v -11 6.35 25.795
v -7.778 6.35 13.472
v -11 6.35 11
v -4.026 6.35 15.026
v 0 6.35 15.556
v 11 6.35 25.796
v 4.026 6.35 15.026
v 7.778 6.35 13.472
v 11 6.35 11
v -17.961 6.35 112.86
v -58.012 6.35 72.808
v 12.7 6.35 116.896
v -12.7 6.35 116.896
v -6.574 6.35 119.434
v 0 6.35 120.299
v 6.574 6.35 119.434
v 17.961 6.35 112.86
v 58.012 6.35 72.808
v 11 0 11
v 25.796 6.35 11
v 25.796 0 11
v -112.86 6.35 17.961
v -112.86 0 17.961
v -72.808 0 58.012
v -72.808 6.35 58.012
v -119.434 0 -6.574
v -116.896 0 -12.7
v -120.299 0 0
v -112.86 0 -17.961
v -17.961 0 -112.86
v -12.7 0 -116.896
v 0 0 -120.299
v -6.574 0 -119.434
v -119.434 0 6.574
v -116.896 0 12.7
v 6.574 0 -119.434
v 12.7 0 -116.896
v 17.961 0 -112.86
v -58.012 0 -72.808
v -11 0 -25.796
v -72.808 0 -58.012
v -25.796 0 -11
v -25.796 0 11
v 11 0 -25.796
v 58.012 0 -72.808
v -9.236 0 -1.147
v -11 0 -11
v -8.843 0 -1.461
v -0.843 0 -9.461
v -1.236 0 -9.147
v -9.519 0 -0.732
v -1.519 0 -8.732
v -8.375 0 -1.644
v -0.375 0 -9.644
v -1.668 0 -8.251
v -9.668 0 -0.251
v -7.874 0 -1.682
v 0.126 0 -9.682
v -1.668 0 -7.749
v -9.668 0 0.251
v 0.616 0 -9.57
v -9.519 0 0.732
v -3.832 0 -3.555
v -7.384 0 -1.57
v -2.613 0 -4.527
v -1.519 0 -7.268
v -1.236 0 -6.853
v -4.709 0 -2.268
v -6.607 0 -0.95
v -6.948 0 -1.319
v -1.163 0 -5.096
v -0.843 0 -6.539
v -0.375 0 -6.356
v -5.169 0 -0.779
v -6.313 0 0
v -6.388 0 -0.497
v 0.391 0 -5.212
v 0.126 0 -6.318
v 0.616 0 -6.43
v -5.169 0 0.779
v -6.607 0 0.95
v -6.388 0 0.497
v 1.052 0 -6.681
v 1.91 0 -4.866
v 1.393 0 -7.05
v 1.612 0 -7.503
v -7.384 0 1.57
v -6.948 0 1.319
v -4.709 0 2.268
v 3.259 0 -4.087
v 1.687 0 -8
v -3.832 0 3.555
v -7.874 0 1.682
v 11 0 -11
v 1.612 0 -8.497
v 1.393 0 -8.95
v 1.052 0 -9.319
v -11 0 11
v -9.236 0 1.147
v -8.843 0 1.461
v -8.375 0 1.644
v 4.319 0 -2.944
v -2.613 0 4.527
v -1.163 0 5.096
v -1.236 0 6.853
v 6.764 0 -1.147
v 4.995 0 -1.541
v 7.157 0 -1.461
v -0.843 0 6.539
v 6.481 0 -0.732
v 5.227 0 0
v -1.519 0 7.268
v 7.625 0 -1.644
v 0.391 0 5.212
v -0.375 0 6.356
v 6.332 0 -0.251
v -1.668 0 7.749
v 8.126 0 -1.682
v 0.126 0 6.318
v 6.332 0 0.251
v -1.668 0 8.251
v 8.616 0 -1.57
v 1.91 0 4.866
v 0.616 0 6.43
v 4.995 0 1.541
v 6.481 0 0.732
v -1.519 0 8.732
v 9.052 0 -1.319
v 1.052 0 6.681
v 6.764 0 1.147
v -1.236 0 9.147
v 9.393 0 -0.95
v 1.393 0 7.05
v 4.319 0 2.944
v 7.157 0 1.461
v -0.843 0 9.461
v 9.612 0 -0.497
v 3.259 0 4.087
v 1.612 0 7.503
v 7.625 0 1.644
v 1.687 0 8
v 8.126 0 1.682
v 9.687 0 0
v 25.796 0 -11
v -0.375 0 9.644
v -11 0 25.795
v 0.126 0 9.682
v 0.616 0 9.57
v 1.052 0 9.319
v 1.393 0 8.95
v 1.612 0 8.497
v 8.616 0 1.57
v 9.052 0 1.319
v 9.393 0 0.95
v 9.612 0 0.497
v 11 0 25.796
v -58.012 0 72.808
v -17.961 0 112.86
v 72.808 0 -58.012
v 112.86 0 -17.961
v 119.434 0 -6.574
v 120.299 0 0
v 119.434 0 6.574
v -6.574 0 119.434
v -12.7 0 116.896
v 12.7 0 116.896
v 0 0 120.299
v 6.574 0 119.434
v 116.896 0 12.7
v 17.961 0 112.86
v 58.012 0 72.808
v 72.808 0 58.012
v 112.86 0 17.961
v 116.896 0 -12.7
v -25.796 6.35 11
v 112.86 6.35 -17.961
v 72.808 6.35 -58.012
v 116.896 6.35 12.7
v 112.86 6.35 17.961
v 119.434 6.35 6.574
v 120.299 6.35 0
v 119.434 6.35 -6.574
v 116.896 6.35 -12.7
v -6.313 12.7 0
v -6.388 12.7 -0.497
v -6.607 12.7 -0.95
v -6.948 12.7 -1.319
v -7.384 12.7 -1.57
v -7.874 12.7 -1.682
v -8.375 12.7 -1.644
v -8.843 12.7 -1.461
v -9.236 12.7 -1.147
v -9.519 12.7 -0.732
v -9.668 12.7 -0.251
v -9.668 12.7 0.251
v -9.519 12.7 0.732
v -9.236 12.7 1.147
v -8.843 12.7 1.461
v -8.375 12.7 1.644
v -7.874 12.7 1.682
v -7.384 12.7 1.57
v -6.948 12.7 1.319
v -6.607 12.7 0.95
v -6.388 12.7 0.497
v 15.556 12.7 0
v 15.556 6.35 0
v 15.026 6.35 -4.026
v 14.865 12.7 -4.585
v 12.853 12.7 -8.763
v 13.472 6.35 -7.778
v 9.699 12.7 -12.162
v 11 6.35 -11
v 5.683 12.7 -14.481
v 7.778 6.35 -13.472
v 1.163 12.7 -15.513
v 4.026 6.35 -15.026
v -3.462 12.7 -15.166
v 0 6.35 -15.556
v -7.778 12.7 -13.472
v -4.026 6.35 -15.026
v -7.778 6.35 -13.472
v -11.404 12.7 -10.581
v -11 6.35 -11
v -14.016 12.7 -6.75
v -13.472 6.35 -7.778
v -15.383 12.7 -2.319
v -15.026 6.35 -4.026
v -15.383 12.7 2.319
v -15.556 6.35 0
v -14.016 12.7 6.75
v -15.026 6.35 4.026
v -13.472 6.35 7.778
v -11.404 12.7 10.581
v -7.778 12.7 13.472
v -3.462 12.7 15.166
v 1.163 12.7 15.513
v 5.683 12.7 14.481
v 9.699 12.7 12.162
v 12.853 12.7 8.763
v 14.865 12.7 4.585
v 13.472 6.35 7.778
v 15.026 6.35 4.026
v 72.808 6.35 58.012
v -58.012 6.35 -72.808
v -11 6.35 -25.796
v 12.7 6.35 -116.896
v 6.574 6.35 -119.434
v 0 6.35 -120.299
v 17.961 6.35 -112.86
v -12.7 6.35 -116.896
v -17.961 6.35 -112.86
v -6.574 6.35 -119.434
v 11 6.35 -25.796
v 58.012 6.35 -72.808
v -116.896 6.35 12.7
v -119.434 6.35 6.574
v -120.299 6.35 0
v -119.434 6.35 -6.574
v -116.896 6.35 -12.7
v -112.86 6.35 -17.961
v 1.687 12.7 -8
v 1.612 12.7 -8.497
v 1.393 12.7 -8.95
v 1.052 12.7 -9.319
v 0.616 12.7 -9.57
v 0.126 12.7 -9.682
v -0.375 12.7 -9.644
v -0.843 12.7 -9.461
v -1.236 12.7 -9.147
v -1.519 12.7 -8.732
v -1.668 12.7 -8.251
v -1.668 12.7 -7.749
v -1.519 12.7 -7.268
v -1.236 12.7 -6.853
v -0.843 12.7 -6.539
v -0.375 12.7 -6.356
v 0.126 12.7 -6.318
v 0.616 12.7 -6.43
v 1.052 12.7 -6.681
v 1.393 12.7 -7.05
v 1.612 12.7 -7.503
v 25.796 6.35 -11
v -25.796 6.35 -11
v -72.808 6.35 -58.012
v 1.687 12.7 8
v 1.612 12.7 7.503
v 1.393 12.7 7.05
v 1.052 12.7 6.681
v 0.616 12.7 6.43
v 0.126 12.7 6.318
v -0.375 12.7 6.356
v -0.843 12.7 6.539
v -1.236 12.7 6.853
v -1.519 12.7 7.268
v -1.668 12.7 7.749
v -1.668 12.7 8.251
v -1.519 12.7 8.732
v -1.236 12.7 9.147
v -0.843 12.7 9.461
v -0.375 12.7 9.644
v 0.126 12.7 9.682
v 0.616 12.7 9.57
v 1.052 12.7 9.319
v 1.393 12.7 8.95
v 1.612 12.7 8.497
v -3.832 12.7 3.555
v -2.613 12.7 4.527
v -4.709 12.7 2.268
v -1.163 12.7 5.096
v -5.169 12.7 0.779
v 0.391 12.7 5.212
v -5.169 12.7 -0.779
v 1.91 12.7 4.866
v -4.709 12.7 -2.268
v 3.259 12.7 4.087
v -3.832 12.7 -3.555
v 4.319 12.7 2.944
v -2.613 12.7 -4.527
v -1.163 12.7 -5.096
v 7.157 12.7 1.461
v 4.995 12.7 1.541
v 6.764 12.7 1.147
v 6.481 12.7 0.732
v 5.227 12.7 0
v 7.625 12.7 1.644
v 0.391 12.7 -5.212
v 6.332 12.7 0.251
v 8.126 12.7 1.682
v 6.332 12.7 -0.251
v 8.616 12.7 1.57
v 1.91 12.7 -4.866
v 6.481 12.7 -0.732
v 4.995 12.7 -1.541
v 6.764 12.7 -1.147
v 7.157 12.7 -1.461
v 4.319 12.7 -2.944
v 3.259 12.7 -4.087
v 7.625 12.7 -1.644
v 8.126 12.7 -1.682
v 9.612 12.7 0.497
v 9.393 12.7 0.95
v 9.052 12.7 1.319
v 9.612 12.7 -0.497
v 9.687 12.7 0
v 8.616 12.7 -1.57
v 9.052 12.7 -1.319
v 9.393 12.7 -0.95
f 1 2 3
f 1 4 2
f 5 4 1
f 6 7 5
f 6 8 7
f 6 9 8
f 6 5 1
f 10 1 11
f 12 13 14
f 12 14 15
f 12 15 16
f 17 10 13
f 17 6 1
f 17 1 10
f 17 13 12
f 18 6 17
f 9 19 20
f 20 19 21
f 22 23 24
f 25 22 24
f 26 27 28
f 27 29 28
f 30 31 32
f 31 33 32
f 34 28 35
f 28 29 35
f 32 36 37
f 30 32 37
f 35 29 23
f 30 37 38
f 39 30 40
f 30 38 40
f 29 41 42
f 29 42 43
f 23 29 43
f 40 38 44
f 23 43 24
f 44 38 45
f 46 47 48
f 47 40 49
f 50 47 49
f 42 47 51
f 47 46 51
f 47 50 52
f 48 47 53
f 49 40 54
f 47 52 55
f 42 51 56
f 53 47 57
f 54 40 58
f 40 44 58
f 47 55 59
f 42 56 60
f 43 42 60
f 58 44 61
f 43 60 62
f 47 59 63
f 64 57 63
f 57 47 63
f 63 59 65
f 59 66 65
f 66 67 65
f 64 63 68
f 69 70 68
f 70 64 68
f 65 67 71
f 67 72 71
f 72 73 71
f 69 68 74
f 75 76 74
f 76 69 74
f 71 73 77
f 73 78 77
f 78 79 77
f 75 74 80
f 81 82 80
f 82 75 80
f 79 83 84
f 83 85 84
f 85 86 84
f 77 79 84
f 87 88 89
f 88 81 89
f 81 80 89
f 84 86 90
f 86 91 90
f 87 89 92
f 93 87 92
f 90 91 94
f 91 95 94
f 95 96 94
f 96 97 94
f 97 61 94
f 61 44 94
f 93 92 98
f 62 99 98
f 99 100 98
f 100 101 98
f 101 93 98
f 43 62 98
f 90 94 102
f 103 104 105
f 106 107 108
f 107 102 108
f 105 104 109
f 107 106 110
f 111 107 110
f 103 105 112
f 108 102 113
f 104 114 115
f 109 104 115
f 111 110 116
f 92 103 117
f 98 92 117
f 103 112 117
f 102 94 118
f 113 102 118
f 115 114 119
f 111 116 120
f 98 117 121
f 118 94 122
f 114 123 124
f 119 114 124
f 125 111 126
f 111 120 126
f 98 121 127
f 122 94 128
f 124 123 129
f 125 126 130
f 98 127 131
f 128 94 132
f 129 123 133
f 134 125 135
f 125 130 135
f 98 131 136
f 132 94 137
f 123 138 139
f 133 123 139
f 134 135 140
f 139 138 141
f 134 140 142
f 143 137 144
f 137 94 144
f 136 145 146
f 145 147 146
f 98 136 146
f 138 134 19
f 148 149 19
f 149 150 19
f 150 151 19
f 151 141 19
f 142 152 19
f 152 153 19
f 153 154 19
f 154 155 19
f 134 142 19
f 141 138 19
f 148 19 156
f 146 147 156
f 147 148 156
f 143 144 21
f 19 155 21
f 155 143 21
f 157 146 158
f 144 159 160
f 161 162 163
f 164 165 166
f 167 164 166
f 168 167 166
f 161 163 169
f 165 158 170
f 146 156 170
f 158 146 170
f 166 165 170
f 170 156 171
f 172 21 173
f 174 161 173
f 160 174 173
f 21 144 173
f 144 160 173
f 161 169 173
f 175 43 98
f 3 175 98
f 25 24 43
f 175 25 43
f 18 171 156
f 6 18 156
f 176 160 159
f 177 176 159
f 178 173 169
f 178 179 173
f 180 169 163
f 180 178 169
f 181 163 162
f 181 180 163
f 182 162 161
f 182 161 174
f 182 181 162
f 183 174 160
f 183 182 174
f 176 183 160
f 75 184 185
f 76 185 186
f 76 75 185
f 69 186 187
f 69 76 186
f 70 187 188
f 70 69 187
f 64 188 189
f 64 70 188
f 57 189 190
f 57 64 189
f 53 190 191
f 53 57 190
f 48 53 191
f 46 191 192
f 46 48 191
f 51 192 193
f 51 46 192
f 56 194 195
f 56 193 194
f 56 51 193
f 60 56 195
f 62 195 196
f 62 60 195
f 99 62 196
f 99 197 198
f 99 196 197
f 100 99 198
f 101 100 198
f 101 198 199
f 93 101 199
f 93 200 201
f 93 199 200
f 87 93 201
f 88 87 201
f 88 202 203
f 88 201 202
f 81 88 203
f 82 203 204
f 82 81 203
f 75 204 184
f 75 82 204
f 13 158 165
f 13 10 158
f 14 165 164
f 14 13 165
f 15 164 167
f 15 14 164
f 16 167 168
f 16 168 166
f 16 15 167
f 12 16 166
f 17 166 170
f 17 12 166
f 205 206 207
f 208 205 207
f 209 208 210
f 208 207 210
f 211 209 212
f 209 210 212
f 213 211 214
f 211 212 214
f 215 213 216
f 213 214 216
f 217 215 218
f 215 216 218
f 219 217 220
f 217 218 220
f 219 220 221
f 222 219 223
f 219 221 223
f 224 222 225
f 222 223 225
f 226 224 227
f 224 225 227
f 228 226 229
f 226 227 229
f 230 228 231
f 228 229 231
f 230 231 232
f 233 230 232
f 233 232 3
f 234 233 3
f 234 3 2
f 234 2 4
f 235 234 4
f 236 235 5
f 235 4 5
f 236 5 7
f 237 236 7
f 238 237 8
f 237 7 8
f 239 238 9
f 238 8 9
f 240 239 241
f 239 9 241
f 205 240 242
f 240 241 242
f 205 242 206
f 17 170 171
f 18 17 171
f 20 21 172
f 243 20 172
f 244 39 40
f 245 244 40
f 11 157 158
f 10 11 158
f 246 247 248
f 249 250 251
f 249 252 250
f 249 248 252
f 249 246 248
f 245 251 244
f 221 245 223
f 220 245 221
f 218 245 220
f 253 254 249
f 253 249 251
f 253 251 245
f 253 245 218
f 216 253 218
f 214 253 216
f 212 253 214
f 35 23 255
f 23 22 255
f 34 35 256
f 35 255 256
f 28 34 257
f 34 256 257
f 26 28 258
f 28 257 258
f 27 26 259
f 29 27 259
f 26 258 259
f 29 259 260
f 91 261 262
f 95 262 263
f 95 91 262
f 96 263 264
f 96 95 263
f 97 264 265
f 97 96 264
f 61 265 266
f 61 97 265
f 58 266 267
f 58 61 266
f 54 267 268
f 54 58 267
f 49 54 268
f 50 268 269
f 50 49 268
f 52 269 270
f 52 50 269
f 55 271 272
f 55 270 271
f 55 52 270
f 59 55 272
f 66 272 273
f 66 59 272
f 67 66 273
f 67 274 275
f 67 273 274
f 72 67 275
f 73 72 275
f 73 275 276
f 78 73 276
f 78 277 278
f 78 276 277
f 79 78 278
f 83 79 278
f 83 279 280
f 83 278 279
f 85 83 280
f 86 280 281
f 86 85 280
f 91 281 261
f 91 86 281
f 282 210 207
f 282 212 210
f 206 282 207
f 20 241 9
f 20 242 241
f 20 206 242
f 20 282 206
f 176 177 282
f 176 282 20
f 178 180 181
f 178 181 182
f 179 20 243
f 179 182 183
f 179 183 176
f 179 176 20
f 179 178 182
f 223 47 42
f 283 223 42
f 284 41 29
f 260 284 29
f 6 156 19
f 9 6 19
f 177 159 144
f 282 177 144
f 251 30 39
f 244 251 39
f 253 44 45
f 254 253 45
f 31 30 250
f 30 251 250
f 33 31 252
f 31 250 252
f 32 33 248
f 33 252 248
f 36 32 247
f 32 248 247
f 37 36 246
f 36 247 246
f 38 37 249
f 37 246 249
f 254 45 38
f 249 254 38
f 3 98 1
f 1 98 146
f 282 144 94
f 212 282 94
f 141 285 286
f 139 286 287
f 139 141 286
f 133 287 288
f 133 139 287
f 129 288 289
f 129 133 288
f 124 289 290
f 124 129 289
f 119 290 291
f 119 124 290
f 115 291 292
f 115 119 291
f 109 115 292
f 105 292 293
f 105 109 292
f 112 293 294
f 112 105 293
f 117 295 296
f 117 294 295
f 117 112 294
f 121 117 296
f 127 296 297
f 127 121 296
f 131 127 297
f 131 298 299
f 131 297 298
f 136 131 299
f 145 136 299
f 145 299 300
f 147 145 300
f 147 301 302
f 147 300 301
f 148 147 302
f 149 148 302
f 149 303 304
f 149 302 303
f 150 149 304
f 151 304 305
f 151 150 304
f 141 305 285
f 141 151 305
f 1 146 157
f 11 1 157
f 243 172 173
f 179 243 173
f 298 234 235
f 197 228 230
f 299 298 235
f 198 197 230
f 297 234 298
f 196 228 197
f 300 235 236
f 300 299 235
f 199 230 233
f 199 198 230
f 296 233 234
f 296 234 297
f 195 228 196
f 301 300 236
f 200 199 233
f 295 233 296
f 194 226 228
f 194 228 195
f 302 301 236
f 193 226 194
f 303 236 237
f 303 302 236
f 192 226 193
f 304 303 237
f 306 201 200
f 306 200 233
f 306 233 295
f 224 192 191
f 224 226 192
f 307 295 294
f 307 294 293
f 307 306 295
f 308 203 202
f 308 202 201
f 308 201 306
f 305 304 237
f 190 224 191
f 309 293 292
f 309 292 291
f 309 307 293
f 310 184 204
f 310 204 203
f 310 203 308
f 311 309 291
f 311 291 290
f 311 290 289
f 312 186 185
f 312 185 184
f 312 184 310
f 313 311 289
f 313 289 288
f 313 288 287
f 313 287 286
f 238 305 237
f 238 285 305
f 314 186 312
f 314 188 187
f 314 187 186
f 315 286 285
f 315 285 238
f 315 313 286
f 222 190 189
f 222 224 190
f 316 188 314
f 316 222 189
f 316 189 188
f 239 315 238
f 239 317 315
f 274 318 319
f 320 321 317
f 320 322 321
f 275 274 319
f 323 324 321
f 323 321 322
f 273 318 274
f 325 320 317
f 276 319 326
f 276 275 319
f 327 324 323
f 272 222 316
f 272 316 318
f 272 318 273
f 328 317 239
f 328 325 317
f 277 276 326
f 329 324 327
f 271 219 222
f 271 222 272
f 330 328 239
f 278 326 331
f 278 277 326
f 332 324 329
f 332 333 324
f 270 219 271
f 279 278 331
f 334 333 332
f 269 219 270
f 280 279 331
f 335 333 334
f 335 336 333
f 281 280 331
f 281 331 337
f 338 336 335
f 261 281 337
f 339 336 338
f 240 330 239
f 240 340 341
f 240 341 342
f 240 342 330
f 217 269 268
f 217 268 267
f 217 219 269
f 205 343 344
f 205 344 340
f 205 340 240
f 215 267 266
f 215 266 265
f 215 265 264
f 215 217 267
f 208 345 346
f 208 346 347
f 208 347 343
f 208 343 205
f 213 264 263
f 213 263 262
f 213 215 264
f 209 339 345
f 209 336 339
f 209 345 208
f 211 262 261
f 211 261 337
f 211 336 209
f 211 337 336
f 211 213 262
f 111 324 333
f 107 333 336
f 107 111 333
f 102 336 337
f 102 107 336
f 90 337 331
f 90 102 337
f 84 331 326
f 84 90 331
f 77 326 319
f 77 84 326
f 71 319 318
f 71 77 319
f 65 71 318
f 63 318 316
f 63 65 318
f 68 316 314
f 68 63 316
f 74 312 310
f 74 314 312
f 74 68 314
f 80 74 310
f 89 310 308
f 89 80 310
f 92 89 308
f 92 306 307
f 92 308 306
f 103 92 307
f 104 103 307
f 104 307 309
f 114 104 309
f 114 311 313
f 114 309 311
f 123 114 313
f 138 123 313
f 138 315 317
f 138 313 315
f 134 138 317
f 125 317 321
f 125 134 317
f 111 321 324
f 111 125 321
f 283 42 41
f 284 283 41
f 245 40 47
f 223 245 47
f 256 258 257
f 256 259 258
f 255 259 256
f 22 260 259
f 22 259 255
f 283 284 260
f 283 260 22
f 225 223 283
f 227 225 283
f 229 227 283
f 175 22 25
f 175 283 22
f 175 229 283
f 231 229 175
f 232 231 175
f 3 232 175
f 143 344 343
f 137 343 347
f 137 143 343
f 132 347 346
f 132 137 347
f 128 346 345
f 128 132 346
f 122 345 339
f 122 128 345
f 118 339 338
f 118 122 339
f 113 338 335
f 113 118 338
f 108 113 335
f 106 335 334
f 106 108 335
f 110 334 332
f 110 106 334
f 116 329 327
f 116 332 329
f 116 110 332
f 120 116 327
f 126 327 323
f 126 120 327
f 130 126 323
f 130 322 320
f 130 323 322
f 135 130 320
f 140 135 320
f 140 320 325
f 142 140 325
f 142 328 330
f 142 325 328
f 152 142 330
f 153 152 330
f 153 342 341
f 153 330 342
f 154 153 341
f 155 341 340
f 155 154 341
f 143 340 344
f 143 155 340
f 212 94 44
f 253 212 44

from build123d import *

# Parameters (mm, degrees)
BOSS_EXTRUDE5_DEPTH      = 6.35
FILLET1_R                = 25.4
CIRPATTERN7_COUNT        = 4
FILLET1_OF_CIRPATTERN7_R = 25.4
SKETCH13_R               = 15.556349186
BOSS_EXTRUDE8_DEPTH      = 6.35
SKETCH1_R                = 5.22699996
SKETCH1_R_2              = 1.686500056
CUT_EXTRUDE1_DEPTH       = 13.7


with BuildPart() as part:
    # Sketch4 → Boss-Extrude5 (new body)
    with BuildSketch(Plane(origin=(0, 0, 0), x_dir=(1, 0, 0), z_dir=(0, 1, 0))):
        Polygon((25.7955, 11), (25.7955, -11), (72.807954542, -58.012454542), (130.820409084, 0), (72.807954542, 58.012454542), align=None)
        Polygon((25.7955, 11), (14.7955, 0), (25.7955, -11), align=None)
        Polygon((25.7955, -11), (14.7955, 0), (25.7955, 11), (0, 11), (0, -11), align=None)
    boss_extrude5 = extrude(amount=BOSS_EXTRUDE5_DEPTH)

    # Fillet1
    fillet1_edges = [part.edges().sort_by_distance(p)[0] for p in [
        (130.820409084, 3.175, 0),
    ]]
    fillet(fillet1_edges, radius=FILLET1_R)

    # CirPattern7: Boss-Extrude5 ×4 about axis
    cirpattern7_axis = Axis((0, 0, 0), (0, 1, 0))
    for i in range(1, CIRPATTERN7_COUNT):
        add(boss_extrude5.rotate(cirpattern7_axis, i * 360 / CIRPATTERN7_COUNT))

    # Fillet1 of CirPattern7
    fillet1_of_cirpattern7_edges = [part.edges().sort_by_distance(p)[0] for p in [
        (0, 3.175, -130.820409084),
        (-130.820409084, 3.175, 0),
        (0, 3.175, 130.820409084),
    ]]
    fillet(fillet1_of_cirpattern7_edges, radius=FILLET1_OF_CIRPATTERN7_R)

    # Sketch13 → Boss-Extrude8 (add)
    with BuildSketch(Plane(origin=(0, 6.35, 0), x_dir=(1, 0, 0), z_dir=(0, 1, 0))):
        Circle(SKETCH13_R)
    extrude(amount=BOSS_EXTRUDE8_DEPTH)

    # Sketch1 → Cut-Extrude1 (cut, through all)
    with BuildSketch(Plane(origin=(0, 0, 0), x_dir=(1, 0, 0), z_dir=(0, 1, 0))):
        Circle(SKETCH1_R)
        with Locations((8.000000002, 0)):
            Circle(SKETCH1_R_2)
        with Locations((0, -8.000000002)):
            Circle(SKETCH1_R_2)
        with Locations((-8.000000002, 0)):
            Circle(SKETCH1_R_2)
        with Locations((0, 8.000000002)):
            Circle(SKETCH1_R_2)
    extrude(amount=CUT_EXTRUDE1_DEPTH, mode=Mode.SUBTRACT)


solid = part.part
